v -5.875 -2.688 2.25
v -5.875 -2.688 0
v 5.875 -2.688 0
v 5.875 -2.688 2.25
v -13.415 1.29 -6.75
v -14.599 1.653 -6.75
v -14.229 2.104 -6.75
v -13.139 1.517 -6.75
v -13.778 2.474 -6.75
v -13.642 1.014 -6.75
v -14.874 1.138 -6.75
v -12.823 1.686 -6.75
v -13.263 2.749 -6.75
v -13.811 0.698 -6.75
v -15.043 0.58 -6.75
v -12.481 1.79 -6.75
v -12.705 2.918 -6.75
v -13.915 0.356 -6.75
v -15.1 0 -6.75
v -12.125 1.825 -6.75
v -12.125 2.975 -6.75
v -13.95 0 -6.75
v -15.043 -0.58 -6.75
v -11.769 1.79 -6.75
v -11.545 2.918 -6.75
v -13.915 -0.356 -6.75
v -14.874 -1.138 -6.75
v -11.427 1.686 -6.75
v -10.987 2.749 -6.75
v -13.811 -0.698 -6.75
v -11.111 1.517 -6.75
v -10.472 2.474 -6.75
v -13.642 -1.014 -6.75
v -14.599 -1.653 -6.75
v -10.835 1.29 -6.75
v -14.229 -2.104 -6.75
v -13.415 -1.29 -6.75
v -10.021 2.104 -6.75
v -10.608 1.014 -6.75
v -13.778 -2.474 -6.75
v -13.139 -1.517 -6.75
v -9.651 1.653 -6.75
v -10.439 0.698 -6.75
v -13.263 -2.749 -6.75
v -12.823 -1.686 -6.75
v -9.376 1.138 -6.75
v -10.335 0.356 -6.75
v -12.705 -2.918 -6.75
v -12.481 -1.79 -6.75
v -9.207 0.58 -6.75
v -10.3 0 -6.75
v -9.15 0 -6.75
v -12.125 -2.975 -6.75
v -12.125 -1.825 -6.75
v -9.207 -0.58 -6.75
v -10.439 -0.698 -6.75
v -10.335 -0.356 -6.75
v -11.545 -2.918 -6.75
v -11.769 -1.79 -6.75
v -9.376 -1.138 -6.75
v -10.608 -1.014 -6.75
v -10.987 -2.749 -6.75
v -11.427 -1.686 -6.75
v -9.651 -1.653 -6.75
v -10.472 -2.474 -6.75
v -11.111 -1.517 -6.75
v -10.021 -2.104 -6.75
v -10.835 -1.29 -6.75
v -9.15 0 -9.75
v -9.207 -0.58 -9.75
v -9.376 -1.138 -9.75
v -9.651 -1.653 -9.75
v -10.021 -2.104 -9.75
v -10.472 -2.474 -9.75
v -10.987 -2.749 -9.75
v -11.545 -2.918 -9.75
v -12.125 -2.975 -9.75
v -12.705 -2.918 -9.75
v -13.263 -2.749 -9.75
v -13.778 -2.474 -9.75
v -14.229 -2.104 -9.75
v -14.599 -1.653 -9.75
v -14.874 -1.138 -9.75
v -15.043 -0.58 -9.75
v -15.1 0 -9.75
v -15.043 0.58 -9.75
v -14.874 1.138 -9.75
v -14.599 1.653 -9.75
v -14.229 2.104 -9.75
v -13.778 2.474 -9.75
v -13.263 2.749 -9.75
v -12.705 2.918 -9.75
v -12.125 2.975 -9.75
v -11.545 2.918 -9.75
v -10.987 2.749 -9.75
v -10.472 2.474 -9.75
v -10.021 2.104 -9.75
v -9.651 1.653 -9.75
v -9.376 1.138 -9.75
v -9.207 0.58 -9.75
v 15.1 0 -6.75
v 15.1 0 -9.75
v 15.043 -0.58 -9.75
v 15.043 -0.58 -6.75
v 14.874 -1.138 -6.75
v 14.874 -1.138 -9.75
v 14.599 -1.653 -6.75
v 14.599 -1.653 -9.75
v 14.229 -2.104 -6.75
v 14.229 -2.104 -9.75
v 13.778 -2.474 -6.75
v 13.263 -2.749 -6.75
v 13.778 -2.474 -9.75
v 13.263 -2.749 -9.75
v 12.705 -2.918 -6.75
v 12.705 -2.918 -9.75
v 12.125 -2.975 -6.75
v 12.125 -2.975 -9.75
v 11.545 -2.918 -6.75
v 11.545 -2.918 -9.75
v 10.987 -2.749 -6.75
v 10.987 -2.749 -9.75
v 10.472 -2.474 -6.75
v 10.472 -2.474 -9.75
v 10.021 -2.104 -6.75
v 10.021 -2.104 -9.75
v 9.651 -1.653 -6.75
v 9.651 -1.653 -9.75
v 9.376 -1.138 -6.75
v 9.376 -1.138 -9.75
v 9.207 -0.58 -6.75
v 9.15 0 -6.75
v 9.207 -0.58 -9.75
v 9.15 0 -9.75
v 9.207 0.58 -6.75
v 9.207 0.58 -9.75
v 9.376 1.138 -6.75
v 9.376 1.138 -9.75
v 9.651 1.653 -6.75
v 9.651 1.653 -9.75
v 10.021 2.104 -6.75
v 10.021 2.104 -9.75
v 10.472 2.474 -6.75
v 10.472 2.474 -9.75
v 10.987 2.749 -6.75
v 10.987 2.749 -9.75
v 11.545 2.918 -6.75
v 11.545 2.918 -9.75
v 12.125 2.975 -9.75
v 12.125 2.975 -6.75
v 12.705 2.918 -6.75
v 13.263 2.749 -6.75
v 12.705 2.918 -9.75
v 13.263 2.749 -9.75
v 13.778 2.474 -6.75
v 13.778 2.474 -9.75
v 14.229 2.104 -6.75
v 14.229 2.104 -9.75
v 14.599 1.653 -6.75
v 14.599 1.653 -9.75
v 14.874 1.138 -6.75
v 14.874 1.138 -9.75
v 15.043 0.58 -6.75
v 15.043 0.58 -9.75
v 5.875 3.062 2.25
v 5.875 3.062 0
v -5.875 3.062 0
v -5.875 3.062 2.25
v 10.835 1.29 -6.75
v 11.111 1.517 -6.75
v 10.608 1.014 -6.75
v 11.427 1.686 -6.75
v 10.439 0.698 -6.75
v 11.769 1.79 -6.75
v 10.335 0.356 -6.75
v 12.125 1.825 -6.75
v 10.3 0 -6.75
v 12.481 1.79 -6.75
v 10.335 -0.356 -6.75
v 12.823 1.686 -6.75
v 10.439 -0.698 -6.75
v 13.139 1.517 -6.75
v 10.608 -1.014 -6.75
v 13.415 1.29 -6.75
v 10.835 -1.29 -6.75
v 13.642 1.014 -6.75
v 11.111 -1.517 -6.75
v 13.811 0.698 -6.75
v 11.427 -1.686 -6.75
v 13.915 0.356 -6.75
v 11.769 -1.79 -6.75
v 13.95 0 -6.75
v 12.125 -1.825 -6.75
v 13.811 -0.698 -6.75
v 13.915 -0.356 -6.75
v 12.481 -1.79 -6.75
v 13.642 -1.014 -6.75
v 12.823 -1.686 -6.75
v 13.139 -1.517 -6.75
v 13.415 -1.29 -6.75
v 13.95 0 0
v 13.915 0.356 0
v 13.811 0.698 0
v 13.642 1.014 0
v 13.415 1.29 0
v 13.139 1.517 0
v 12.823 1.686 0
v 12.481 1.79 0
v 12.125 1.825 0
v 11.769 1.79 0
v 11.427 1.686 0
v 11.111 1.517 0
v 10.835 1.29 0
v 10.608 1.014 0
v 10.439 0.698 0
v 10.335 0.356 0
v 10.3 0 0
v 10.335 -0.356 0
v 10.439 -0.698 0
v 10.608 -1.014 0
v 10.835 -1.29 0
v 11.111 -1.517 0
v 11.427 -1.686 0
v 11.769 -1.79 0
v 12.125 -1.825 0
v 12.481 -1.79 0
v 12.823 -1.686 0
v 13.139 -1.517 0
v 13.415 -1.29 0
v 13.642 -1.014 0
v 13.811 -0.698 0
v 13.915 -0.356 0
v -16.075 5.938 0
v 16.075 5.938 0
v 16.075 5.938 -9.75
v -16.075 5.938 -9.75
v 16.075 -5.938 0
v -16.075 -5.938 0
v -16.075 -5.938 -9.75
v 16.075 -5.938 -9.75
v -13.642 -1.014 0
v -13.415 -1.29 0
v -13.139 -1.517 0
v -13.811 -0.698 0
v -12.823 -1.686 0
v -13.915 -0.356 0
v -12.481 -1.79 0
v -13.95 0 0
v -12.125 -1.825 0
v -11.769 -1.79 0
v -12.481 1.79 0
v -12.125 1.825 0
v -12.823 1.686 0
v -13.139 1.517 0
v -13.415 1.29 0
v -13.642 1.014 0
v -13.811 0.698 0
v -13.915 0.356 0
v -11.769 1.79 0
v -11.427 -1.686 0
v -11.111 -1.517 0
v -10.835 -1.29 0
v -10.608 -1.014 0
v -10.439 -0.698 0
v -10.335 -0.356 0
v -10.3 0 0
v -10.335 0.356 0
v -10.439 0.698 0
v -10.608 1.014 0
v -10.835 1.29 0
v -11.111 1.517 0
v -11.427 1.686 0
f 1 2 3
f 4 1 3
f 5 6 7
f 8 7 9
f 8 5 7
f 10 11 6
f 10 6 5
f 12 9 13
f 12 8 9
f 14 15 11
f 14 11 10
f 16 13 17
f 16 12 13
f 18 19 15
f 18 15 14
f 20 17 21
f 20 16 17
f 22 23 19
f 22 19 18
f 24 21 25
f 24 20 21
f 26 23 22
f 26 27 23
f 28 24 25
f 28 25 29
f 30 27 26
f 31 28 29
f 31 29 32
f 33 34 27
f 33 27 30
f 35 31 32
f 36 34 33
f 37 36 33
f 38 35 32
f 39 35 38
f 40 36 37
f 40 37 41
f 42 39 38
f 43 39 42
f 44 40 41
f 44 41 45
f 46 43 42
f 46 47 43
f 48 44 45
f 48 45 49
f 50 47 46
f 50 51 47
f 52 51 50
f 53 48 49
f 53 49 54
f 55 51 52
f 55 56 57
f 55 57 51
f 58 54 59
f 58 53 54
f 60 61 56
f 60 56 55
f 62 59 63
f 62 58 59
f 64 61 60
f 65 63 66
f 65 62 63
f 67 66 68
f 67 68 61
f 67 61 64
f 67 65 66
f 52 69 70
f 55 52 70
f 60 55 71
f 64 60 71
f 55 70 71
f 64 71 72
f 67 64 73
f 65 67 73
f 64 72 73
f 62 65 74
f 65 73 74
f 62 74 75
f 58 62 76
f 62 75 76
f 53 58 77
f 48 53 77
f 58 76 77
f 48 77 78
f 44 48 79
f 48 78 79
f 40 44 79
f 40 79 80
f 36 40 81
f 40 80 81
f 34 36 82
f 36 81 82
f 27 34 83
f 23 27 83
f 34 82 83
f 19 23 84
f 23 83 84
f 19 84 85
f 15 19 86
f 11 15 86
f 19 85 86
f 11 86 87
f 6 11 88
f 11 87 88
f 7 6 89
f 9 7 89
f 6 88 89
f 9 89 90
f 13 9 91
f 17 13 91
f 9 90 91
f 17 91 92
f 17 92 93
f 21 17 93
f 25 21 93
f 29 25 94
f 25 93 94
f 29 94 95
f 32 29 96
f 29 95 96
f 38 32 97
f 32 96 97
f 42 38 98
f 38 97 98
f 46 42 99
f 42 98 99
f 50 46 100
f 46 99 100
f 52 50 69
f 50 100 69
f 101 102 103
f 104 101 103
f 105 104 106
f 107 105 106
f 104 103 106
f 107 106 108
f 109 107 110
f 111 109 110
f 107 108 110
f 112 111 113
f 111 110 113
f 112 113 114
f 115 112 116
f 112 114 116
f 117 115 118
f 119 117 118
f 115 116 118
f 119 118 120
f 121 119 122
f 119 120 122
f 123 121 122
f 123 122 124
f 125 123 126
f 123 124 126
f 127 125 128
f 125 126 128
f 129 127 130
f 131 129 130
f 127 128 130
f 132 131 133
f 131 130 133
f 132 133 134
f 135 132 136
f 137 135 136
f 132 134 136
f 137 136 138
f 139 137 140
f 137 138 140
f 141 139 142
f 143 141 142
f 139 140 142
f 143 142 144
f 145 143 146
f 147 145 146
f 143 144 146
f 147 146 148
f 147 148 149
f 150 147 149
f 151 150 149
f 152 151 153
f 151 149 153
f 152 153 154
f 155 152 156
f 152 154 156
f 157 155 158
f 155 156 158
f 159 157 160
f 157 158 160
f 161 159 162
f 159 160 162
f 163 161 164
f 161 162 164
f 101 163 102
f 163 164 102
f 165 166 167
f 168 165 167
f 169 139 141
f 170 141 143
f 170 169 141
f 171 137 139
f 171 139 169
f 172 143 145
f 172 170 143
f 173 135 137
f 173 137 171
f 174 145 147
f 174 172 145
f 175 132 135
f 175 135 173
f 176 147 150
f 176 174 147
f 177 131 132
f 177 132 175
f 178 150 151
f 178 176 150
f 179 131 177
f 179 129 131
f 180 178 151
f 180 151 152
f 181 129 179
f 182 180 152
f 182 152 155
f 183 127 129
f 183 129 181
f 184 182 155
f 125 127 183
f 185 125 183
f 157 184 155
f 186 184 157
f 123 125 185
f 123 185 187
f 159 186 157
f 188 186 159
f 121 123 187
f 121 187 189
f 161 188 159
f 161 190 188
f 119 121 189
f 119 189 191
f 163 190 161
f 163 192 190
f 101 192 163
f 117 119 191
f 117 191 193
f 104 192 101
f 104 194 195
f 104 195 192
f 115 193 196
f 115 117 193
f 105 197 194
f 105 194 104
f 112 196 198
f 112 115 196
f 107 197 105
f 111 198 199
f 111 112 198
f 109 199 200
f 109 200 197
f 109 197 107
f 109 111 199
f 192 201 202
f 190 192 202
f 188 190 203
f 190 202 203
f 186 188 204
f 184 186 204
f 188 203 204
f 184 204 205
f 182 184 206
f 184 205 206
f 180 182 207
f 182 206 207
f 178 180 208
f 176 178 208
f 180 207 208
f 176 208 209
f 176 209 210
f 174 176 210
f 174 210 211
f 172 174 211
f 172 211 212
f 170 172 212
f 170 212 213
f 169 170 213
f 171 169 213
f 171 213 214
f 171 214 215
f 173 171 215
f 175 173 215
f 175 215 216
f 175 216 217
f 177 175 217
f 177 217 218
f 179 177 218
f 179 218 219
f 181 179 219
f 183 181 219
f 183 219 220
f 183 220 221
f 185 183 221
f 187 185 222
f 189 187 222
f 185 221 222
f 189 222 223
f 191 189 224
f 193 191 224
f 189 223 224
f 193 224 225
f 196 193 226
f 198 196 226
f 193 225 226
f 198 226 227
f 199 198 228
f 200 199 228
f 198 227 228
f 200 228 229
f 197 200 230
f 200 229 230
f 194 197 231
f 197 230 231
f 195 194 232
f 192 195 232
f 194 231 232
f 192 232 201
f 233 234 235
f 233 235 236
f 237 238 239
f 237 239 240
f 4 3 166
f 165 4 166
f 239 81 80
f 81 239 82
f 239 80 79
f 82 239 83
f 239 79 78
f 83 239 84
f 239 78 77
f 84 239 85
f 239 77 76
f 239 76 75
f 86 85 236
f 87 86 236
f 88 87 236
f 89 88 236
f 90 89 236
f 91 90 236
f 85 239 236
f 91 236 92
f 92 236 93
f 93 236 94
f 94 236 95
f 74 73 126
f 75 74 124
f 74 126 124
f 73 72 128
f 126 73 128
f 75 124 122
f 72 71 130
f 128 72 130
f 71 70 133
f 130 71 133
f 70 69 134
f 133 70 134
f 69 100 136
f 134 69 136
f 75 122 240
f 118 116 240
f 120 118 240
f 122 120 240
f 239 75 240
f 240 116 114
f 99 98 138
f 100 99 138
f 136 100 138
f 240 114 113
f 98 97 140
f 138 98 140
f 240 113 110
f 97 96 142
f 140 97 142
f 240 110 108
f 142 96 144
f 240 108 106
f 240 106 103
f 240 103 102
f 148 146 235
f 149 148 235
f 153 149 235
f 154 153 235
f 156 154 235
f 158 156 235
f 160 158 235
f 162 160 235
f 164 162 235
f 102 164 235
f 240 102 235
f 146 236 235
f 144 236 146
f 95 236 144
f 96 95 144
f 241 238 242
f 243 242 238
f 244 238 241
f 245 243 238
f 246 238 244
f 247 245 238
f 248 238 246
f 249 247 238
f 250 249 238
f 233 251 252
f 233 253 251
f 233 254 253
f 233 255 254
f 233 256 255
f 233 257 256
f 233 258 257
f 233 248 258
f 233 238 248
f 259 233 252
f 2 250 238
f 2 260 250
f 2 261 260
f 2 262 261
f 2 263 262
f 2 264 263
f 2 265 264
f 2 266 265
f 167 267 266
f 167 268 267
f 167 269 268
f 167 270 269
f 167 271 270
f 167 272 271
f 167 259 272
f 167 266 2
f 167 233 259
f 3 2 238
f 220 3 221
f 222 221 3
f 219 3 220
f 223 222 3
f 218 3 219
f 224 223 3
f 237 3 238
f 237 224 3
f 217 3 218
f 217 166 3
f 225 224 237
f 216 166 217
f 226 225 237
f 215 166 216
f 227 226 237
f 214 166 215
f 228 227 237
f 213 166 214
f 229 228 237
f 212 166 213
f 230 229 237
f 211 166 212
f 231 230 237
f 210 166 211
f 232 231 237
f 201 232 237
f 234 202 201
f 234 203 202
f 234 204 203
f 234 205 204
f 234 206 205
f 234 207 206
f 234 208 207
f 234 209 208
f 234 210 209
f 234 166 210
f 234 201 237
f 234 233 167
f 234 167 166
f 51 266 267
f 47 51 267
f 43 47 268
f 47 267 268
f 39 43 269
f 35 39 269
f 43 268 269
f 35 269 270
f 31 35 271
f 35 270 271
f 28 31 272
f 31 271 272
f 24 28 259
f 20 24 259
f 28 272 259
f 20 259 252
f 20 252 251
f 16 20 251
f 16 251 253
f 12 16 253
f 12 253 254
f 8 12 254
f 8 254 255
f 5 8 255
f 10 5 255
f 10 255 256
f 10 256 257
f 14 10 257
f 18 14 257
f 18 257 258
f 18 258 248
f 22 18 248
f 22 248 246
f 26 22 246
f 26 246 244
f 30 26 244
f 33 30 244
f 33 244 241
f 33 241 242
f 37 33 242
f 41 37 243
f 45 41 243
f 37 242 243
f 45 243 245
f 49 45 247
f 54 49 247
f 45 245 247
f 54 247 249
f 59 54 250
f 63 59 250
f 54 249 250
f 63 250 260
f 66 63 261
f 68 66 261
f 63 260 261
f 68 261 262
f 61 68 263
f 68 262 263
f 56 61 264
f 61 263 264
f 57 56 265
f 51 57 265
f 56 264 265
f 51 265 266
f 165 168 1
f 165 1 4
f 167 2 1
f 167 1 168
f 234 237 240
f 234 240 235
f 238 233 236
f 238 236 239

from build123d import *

# Parameters (mm, degrees)
F1_R     = 1.825
F1_W     = 5.875
F1_H     = 5.75
F2_DEPTH = 9.75
F3_DEPTH = 2.25
F4_R     = 2.975
F4_R_2   = 1.825
F5_DEPTH = 3


with BuildPart() as f2:
    # F1 (on Top) → F2 (new body)
    with BuildSketch(Plane.XY):
        Polygon((-7.875, 3.0625), (-7.875, 5.9375), (-16.075, 5.9375), (-16.075, -5.9375), (-7.875, -5.9375), (-7.875, -2.6875), (-5.875, -2.6875), (-5.875, 3.0625), align=None)
        with Locations((-12.125, 0)):
            Circle(F1_R, mode=Mode.SUBTRACT)
        with Locations((-2.9375, 0.1875)):
            Rectangle(F1_W, F1_H)
        Polygon((-7.875, -5.9375), (0, -5.9375), (0, -2.6875), (-5.875, -2.6875), (-7.875, -2.6875), align=None)
        Polygon((0, -5.9375), (7.875, -5.9375), (7.875, -2.6875), (5.875, -2.6875), (0, -2.6875), align=None)
        Polygon((0, 3.0625), (0, 5.9375), (-7.875, 5.9375), (-7.875, 3.0625), (-5.875, 3.0625), align=None)
        Polygon((7.875, 3.0625), (7.875, 5.9375), (0, 5.9375), (0, 3.0625), (5.875, 3.0625), align=None)
        with Locations((2.9375, 0.1875)):
            Rectangle(F1_W, F1_H)
        Polygon((16.075, -5.9375), (16.075, 5.9375), (7.875, 5.9375), (7.875, 3.0625), (5.875, 3.0625), (5.875, -2.6875), (7.875, -2.6875), (7.875, -5.9375), align=None)
        with Locations((12.125, 0)):
            Circle(F1_R, mode=Mode.SUBTRACT)
    extrude(amount=-F2_DEPTH)

    # F1 (on Top) → F3 (join)
    with BuildSketch(Plane.XY):
        with Locations((-2.9375, 0.1875)):
            Rectangle(F1_W, F1_H)
        with Locations((2.9375, 0.1875)):
            Rectangle(F1_W, F1_H)
    extrude(amount=F3_DEPTH)

    # F4 (on face) → F5 (cut)
    with BuildSketch(Plane(origin=(0, 0, -9.75), x_dir=(1, 0, 0), z_dir=(0, 0, -1))):
        with Locations((12.125, 0)):
            Circle(F4_R)
        with Locations((12.125, 0)):
            Circle(F4_R_2, mode=Mode.SUBTRACT)
        with Locations((-12.125, 0)):
            Circle(F4_R)
        with Locations((-12.125, 0)):
            Circle(F4_R_2, mode=Mode.SUBTRACT)
        with Locations((12.125, 0)):
            Circle(F4_R_2)
        with Locations((-12.125, 0)):
            Circle(F4_R_2)
    extrude(amount=-F5_DEPTH, mode=Mode.SUBTRACT)


solid = f2.part
